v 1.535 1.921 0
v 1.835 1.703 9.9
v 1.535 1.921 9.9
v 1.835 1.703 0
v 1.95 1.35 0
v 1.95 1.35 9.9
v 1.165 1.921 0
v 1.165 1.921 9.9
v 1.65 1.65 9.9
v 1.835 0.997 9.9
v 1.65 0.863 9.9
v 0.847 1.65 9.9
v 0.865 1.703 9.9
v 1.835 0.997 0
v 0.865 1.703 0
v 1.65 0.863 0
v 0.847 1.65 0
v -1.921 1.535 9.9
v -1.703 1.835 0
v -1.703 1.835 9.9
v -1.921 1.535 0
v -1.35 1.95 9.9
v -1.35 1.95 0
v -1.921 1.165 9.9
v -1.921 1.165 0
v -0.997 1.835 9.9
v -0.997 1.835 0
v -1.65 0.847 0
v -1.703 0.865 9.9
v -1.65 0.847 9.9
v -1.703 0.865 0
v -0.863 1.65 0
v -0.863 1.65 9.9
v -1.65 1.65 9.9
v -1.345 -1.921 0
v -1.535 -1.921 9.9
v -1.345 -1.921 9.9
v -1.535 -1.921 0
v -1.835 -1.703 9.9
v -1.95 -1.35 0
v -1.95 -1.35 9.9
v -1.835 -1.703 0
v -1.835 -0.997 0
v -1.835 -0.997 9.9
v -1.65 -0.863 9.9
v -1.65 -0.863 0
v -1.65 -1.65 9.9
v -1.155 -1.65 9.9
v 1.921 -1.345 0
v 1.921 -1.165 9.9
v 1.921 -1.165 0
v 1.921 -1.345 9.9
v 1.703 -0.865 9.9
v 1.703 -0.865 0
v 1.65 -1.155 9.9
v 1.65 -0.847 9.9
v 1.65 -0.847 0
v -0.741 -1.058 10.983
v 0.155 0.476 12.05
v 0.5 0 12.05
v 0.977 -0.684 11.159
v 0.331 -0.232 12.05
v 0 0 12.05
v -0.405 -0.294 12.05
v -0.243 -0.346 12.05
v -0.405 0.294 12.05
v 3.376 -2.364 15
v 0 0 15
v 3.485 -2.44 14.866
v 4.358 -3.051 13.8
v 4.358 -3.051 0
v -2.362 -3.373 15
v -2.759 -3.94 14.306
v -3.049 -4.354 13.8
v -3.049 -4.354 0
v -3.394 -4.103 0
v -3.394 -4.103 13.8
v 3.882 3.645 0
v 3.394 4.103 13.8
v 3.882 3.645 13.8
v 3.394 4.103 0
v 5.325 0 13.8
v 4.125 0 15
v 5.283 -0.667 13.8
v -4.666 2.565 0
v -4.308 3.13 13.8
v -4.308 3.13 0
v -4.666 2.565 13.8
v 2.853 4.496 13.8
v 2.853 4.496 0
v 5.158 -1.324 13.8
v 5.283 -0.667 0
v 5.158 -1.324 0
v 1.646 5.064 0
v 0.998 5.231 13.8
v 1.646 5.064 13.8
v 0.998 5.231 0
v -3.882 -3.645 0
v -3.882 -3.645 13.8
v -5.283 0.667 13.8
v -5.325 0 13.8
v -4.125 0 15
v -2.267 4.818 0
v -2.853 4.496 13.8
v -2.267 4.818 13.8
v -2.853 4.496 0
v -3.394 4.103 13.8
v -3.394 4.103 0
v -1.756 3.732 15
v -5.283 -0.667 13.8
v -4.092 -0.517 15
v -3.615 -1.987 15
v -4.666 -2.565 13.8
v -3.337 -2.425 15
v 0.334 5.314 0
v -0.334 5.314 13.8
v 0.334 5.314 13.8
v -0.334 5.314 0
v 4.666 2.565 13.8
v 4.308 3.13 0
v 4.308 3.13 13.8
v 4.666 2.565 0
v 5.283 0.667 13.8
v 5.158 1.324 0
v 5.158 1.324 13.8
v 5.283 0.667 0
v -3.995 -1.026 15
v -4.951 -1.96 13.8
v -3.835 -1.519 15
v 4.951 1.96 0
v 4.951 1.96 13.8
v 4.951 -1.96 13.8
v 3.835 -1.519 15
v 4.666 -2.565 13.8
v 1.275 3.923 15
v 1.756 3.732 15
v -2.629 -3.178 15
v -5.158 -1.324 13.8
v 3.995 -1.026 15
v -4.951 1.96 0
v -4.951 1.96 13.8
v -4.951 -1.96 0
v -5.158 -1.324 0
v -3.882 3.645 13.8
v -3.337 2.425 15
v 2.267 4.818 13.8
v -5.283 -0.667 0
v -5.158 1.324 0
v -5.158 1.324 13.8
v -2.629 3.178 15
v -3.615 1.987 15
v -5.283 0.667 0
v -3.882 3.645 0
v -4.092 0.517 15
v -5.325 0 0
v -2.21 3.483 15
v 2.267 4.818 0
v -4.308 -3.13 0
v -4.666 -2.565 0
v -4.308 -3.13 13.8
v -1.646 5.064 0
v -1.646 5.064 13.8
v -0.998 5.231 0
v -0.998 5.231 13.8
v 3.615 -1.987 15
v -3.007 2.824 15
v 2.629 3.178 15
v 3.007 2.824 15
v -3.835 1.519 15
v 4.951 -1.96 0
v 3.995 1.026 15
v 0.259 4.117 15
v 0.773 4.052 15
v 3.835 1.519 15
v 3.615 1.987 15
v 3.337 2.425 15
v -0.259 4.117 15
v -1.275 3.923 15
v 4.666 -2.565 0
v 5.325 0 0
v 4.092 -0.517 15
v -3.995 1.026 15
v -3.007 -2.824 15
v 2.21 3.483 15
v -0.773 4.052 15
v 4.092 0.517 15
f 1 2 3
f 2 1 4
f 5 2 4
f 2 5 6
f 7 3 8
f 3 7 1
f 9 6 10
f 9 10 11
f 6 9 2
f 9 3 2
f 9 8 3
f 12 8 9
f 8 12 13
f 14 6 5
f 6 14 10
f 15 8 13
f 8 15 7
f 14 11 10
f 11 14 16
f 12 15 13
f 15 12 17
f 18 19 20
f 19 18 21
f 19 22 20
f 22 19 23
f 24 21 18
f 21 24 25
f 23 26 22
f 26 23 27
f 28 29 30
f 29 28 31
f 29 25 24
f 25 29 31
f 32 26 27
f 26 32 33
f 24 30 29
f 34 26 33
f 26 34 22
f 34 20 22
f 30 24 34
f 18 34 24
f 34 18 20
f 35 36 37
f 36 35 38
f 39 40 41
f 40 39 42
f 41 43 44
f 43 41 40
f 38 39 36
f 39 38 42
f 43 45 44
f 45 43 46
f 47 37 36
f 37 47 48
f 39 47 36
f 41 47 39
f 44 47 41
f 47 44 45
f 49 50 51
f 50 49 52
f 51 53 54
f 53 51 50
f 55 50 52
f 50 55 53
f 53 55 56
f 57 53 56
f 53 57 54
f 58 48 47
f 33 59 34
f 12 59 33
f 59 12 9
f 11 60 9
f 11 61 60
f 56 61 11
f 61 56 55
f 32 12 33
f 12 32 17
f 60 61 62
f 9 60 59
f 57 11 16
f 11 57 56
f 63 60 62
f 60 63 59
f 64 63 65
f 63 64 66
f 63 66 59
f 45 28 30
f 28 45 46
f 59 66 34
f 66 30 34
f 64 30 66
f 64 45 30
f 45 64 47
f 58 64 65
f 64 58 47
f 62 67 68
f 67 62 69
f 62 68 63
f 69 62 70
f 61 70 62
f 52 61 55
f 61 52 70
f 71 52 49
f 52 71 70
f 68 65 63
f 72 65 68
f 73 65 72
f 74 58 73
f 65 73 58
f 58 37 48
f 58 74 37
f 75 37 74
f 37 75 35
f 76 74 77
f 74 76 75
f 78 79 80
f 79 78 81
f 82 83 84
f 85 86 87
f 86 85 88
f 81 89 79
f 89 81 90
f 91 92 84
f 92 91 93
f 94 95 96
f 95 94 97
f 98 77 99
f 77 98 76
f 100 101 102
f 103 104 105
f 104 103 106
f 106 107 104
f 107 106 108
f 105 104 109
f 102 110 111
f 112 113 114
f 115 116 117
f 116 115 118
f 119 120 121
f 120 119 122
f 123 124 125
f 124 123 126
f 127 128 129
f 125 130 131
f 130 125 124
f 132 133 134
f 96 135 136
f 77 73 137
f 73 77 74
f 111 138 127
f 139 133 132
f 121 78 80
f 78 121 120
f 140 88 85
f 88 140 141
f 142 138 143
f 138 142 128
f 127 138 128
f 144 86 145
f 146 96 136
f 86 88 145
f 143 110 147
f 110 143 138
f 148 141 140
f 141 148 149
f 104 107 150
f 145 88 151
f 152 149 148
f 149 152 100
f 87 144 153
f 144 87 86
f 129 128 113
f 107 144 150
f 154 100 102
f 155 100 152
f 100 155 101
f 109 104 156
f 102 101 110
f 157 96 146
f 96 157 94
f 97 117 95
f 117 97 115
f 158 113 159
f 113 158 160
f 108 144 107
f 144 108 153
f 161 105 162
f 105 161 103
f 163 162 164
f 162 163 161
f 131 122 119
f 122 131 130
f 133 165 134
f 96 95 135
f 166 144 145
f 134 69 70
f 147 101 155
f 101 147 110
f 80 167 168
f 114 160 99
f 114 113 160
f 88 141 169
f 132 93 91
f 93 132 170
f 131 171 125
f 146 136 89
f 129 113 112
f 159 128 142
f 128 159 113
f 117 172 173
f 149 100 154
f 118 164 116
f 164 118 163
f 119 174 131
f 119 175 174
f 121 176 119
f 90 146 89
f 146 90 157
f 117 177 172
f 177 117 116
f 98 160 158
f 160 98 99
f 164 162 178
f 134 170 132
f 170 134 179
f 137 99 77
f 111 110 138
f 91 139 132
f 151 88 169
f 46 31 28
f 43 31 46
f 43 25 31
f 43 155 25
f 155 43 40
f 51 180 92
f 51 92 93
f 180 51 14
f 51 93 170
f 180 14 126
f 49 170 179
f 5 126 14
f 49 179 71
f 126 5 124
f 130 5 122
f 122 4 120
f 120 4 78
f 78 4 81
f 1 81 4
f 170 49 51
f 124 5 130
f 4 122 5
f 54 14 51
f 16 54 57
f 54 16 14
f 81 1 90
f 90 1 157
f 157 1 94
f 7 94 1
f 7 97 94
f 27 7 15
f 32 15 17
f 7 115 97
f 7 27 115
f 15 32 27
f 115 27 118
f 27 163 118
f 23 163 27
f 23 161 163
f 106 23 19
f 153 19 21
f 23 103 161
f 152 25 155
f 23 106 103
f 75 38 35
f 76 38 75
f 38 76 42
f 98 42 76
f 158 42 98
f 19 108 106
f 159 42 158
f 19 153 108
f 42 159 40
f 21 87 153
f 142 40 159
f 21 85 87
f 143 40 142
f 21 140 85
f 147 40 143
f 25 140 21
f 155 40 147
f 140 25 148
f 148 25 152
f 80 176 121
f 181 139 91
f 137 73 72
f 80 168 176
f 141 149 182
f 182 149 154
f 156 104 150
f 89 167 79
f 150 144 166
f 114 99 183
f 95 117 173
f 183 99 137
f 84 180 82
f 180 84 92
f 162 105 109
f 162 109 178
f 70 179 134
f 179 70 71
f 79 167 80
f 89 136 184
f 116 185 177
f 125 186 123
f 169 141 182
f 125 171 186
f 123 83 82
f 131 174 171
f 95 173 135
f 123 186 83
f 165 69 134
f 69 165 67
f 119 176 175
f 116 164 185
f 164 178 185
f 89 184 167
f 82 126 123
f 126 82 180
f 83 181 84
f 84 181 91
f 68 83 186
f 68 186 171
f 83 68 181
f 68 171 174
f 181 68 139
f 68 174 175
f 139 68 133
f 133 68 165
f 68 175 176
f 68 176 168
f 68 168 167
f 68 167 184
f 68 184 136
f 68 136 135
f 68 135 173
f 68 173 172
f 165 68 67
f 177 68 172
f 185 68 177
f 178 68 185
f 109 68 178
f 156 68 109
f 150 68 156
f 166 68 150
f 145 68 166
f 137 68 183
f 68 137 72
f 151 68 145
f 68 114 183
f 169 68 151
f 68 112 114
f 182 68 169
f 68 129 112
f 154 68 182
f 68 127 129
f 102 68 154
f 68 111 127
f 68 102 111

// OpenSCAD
// Push button generator
// Makes round or square buttons with round or square shaft holes, and bevelled edges
// square holes are keyholed to prevent rounding of internal corners
// holes are vaulted so no support will be needed inside them
// customizer compatible

//defualt is to
// Make replacement buttons for Atlas stove
// button is a round button press fit onto a square 3.3mm shaft
// this is a standard size for "isostat" switches

/* [Global] */
//Visualising
Show="CrossSection"; //[Complete,CrossSection]
//Outside shape of button
ButtonShape="Round"; //[Round,Square,Oval]

/* [Button] */
//Length of Button
L=15;

//Outside Diameter of Round Button
ButtonOD=10.65;

//Rectangular or oval ButtonX
ButtonX=15;
//Rectangular or oval ButtonY
ButtonY=10;

//amount of bevel around top edge of button
TopBevel=1.2;
//Style of the button edge (for square buttons)
EdgeStyle="Round"; //[Radius,Bevel,Square]
//Bevel of bevelled edges. (This is X,Y distance, not the bevel face length)
EdgeBevel=1.2;
//Radius of rounded edges
EdgeR=1.2;
   
/* [Shaft Hole] */
ShaftShape="Square"; //[Square,Round]
//Length of shaft inside button. Crown of hole is vaulted for support free build
ShaftL=10;
//Side width of square shafts or diameter of round shafts
ShaftW=3.3;
//Oversize in mm for internal holes (diameter). UP printer makes internal holes small. Adjuest this for correct internal size
holeos=0;
//So that square shaft holes don't have rounded corners they must have a keyhole at the corner
ShaftKeyholeD=1.2;

KeyholeR=ShaftKeyholeD/2;

OR=ButtonOD/2;
ShaftI=ShaftW+holeos; //side length or IR
ShaftR=(ShaftW+holeos)/2; //for round shafts

//------


module SqShaft() {
    hull() { 
    translate([-ShaftI/2,-ShaftI/2,0]) 
        cube([ShaftI, ShaftI,ShaftL]);
     translate([0,0,ShaftL+ShaftI/2])
        cylinder(r=0.5,h=0.5);
    }//hull
    KHO=ShaftI/2-KeyholeR/2;
    for (A=[0:3]) {
        rotate([0,0,A*90])            
            translate([KHO,KHO,0]) 
                cylinder(r=KeyholeR, h=ShaftL,$fn=10);
    }//for

}//mod
module RoundShaft() {
    cylinder(r=ShaftR, h=ShaftL, $fn=20);
    translate([0,0,ShaftL])
        cylinder(r1=ShaftR,r2=0.1,h=ShaftR); //vault at top of hole
}//mod

module RoundButton() {
        H1=L-TopBevel;
        hull() {
            cylinder(r=OR, h=H1, $fn=50);
            translate([0,0,H1]) 
            cylinder(r=OR-TopBevel, h=TopBevel,$fn=50);  
        };//hull  
}//mod

module SquareButton() {
        H1=L-TopBevel;
        hull() {
            //translate([0,0,H1/2]) cube([ButtonX,ButtonY,H1], center=true);
            for (iX=[1,-1],iY=[1,-1]) {         
                    translate([(ButtonX/2-EdgeBevel)*iX,(ButtonY/2-EdgeBevel)*iY,H1/2]) 
                        if (EdgeStyle=="Bevel") {
                                rotate([0,0,45]) //bevels are made by using edge of these cubes at 45deg
                                    cube([EdgeBevel*sqrt(2),EdgeBevel*sqrt(2),H1],center=true);
                        } else {
                            if (EdgeStyle!="Square") {
                                cylinder(r=EdgeR, h=H1, center=true,$fn=20);
                            } else {
                                cylinder(r=0.1, h=H1, center=true,$fn=20);
                            }//if                                
                        }//if
                    }//for
            translate([0,0,H1+TopBevel/2]) 
                 cube([ButtonX-(2*TopBevel),ButtonY-(2*TopBevel),TopBevel], center=true); //bevelled top
        }//hull  
}//mod

difference() {
    if (ButtonShape=="Square") {
        SquareButton();
    } else { //round, oval
        RoundButton();
    };
    translate([0,0,-0.1])  {
        if (ShaftShape=="Round") {
            RoundShaft();
        }else{
            SqShaft();
        }//if
        if (Show=="CrossSection") {
            //MM=max(ButtonX,ButtonY);
            rotate([0,0,-125]) cube([100,100,L+1]);
    }//if
}//translate
}//difference
